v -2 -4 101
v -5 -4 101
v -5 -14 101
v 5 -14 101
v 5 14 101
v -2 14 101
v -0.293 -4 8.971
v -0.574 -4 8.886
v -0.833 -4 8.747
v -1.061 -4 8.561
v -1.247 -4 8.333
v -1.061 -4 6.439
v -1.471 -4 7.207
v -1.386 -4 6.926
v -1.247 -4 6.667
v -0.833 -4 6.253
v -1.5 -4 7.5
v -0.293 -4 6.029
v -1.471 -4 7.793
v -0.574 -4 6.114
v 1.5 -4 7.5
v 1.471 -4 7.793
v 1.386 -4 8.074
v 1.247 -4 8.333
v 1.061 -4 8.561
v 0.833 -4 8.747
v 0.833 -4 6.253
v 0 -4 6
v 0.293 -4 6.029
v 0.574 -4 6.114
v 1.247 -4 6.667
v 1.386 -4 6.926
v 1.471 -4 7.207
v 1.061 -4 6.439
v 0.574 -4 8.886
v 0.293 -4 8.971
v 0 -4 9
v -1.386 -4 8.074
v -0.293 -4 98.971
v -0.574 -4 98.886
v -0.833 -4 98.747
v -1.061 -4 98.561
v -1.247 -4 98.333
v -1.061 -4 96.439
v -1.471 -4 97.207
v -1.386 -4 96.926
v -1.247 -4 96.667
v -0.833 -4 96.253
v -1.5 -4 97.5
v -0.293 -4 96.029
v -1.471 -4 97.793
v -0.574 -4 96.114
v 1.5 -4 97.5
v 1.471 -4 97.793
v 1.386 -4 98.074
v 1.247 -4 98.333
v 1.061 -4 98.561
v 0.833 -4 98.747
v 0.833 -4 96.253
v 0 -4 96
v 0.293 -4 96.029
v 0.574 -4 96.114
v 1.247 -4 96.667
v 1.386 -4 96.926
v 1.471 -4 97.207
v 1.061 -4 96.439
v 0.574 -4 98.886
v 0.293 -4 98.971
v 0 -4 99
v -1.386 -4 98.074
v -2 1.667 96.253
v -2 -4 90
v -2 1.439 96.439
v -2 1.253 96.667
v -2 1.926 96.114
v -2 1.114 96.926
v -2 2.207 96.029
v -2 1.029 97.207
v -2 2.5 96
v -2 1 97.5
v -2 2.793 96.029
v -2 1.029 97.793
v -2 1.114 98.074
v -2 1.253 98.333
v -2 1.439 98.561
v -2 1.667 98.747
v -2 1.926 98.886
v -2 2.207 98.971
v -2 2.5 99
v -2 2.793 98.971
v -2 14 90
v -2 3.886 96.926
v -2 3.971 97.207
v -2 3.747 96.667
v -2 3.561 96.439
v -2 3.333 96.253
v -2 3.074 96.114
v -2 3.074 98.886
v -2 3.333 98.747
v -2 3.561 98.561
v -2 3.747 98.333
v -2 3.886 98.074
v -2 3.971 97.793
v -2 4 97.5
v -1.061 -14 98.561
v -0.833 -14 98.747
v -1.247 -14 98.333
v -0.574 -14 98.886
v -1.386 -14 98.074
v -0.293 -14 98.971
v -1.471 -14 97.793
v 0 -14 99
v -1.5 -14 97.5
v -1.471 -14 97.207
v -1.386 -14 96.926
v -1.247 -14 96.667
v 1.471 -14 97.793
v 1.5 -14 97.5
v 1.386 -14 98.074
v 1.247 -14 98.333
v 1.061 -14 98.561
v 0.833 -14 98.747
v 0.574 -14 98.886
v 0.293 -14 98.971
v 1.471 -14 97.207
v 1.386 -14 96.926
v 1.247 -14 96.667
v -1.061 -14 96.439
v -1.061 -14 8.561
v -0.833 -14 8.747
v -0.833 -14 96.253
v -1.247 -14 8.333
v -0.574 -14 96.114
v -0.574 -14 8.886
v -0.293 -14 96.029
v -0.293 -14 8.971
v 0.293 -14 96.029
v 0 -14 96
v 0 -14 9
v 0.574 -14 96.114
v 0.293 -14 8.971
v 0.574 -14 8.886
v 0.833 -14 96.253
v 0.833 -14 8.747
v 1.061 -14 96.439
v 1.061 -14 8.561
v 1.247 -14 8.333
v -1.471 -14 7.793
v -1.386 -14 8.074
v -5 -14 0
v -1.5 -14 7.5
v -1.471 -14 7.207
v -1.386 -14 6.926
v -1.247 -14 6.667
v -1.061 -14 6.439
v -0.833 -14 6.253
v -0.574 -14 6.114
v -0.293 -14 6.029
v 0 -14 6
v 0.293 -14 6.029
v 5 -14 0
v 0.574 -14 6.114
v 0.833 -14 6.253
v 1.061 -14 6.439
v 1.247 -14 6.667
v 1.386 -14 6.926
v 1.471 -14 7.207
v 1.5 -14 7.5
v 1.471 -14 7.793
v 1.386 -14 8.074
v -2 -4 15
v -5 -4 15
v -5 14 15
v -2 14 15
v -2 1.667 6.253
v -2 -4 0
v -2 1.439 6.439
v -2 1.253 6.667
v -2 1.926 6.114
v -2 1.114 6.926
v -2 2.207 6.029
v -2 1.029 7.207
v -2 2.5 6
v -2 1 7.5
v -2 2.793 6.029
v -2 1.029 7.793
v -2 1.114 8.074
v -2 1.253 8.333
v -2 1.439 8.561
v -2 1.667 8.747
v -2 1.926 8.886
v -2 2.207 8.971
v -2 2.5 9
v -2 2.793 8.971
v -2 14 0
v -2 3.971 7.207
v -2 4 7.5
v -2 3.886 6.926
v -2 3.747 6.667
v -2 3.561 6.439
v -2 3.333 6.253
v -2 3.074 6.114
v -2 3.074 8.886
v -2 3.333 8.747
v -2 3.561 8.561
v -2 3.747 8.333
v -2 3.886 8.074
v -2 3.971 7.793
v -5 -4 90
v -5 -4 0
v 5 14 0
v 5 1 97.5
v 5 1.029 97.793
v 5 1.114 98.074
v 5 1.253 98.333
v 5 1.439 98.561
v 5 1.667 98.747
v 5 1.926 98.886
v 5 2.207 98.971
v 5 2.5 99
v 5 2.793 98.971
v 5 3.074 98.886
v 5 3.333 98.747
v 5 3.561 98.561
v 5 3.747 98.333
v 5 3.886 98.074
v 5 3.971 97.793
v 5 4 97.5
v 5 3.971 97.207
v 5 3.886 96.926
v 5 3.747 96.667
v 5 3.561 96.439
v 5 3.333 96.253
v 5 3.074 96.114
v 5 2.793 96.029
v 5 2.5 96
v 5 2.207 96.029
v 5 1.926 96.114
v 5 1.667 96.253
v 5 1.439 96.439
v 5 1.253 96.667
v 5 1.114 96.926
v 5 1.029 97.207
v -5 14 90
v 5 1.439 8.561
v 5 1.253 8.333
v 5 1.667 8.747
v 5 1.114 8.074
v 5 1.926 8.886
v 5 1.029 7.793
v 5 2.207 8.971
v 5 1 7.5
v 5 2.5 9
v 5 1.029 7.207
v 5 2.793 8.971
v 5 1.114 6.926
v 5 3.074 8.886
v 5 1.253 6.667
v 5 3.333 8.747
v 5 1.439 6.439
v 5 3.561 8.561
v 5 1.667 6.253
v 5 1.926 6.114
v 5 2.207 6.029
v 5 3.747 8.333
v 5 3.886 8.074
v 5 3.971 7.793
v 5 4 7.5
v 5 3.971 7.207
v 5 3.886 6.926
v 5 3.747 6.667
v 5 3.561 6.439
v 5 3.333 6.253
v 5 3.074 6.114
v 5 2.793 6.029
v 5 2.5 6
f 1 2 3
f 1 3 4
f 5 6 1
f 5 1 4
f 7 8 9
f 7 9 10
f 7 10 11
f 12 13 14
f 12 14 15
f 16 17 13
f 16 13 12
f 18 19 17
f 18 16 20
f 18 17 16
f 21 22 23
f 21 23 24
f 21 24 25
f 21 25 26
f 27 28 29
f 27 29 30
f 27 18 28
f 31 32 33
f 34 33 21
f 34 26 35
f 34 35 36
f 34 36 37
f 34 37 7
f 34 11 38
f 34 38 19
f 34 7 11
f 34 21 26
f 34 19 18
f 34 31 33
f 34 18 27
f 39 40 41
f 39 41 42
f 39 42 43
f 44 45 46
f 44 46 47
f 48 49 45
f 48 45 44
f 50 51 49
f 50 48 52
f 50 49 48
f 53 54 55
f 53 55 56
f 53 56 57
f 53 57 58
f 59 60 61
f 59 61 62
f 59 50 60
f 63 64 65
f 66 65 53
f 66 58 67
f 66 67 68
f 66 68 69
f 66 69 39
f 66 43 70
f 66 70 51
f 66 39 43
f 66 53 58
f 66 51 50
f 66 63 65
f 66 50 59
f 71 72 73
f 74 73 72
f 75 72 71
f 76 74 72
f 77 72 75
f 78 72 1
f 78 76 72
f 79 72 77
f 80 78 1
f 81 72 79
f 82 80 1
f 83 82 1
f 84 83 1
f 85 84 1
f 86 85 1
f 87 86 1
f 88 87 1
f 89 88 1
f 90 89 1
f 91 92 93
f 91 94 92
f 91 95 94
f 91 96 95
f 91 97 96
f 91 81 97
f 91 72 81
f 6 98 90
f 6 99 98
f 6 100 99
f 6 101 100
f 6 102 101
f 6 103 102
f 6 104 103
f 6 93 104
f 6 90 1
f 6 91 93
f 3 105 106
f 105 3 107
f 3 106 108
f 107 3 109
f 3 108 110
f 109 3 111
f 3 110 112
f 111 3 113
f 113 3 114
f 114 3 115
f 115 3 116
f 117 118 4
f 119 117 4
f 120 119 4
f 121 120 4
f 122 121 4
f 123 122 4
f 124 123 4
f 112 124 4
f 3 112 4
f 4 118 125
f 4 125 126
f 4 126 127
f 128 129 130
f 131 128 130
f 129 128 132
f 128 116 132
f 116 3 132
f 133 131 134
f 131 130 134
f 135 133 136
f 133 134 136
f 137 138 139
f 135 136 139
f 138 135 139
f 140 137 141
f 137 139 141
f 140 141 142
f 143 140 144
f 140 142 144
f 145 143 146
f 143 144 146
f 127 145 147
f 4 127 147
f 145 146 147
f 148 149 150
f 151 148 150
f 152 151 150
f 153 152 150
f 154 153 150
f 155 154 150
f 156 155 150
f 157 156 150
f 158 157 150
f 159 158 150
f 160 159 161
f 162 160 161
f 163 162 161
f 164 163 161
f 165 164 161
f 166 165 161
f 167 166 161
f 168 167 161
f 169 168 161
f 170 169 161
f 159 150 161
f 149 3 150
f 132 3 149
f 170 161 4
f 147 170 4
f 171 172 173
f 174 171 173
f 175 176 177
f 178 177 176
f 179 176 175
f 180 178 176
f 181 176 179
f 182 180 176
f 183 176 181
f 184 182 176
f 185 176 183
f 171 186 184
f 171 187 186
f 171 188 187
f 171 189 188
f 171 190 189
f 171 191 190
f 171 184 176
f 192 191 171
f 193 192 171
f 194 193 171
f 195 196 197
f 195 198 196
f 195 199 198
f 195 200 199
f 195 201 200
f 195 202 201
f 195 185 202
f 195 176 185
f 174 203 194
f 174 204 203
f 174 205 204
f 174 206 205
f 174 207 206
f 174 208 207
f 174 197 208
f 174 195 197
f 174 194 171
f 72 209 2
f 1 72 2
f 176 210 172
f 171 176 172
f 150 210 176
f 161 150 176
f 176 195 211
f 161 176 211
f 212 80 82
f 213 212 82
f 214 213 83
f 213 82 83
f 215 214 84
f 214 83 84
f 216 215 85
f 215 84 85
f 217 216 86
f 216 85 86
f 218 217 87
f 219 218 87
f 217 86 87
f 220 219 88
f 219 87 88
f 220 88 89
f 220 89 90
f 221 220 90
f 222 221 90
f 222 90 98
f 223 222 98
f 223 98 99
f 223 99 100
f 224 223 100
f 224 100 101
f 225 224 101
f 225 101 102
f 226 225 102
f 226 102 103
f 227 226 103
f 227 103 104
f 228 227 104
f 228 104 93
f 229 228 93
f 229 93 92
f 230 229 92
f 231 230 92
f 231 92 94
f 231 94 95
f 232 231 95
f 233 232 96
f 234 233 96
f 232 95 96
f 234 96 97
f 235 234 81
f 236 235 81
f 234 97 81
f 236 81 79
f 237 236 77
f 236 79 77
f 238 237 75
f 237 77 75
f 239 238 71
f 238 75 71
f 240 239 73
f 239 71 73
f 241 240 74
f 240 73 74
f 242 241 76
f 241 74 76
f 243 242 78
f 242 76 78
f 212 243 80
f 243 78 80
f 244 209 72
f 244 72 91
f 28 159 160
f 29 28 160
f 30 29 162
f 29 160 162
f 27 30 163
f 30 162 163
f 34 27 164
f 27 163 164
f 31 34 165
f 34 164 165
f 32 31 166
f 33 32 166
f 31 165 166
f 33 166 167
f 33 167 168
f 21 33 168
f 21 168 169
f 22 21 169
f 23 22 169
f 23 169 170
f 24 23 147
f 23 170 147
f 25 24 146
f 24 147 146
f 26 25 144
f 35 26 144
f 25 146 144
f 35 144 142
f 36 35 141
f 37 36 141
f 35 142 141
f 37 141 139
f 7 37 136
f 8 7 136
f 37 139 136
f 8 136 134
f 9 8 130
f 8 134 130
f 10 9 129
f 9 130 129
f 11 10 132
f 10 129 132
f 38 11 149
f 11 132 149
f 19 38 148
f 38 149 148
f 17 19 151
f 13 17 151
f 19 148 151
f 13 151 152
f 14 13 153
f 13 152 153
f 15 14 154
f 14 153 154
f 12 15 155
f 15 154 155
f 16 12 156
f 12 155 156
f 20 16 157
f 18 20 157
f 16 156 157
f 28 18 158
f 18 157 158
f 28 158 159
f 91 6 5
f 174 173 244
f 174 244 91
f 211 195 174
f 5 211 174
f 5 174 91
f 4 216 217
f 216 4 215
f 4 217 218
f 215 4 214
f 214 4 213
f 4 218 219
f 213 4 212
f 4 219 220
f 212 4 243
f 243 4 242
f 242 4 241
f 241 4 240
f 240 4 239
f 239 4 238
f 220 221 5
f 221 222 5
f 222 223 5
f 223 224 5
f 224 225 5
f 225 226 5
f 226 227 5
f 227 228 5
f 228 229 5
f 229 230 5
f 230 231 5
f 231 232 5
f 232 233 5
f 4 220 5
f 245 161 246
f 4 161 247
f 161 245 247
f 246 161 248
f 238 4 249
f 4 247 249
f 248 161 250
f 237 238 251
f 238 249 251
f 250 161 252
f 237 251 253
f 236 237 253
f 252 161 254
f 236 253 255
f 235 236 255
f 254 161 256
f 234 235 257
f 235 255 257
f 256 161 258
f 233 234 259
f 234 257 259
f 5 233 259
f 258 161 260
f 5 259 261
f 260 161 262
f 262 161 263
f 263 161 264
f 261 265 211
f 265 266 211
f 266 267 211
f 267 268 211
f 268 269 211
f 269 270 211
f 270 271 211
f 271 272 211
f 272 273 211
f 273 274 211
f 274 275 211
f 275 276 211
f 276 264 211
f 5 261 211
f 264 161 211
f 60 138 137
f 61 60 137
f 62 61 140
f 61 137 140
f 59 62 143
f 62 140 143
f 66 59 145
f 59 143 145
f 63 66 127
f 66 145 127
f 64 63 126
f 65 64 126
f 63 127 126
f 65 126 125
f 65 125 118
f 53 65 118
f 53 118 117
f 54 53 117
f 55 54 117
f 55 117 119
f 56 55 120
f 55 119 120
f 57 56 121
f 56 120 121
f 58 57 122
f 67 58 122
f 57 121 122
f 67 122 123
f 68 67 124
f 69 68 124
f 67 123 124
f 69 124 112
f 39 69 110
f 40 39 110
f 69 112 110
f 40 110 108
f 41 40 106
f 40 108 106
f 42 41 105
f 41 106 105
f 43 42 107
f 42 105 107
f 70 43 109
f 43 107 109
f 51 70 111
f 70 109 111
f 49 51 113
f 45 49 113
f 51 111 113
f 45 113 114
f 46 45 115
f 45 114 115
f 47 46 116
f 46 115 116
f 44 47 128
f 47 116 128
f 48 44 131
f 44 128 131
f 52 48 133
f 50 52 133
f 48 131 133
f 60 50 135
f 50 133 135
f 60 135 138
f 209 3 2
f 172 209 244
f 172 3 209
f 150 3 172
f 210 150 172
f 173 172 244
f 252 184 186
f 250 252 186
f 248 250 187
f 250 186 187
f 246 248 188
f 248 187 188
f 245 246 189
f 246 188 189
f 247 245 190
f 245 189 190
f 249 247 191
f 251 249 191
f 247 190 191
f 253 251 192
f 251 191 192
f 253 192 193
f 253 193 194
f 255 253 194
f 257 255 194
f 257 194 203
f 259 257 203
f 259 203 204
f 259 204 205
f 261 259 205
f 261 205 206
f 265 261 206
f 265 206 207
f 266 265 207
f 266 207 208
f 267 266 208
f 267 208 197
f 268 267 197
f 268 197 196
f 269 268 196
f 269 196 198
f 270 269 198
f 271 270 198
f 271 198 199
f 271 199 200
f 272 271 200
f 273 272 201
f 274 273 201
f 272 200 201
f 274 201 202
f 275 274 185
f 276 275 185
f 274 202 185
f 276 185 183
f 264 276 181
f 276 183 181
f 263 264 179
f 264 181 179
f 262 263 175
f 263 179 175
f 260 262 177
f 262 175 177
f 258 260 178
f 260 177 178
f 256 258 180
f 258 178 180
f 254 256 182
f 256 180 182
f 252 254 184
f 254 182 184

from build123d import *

# Parameters (mm, degrees)
SKETCH_1_W          = 10
SKETCH_1_H          = 28
EXTRUDE_1_DEPTH     = 105
SKETCH_2_R          = 1.5
CUT_EXTRUDE_1_DEPTH = 10
SKETCH_3_R          = 1.5
CUT_EXTRUDE_2_DEPTH = 107.40018797
SKETCH_4_W          = 15
SKETCH_4_H          = 18
CUT_EXTRUDE_3_DEPTH = 3
SKETCH_5_W          = 19.297402577
SKETCH_5_H          = 33.931864009
CUT_EXTRUDE_6_DEPTH = 4


with BuildPart() as part:
    # 草图1 → 凸台-拉伸1 (new body)
    with BuildSketch(Plane.XY):
        Rectangle(SKETCH_1_W, SKETCH_1_H)
    extrude(amount=EXTRUDE_1_DEPTH)

    # 草图2 → 切除-拉伸1 (cut)
    with BuildSketch(Plane.XZ.offset(14)):
        with Locations(Location((0, 97.5, 0), (0, 0, 270))):
            Circle(SKETCH_2_R)
        with Locations(Location((0, 7.5, 0), (0, 0, 270))):
            Circle(SKETCH_2_R)
    extrude(amount=-CUT_EXTRUDE_1_DEPTH, mode=Mode.SUBTRACT)

    # 草图3 → 切除-拉伸2 (cut, through all)
    with BuildSketch(Plane.ZY.offset(5)):
        with Locations(Location((7.5, 2.5, 0), (0, 0, 270))):
            Circle(SKETCH_3_R)
        with Locations(Location((97.5, 2.5, 0), (0, 0, 270))):
            Circle(SKETCH_3_R)
    extrude(amount=-CUT_EXTRUDE_2_DEPTH, mode=Mode.SUBTRACT)

    # 草图4 → 切除-拉伸3 (cut)
    with BuildSketch(Plane.ZY.offset(5)):
        with Locations((7.5, 5)):
            Rectangle(SKETCH_4_W, SKETCH_4_H)
        with Locations((97.5, 5)):
            Rectangle(SKETCH_4_W, SKETCH_4_H)
    extrude(amount=-CUT_EXTRUDE_3_DEPTH, mode=Mode.SUBTRACT)

    # 草图5 → 切除-拉伸6 (cut)
    with BuildSketch(Plane.XY.offset(105)):
        with Locations((1.058128951, -0.39887643)):
            Rectangle(SKETCH_5_W, SKETCH_5_H)
    extrude(amount=-CUT_EXTRUDE_6_DEPTH, mode=Mode.SUBTRACT)


solid = part.part
